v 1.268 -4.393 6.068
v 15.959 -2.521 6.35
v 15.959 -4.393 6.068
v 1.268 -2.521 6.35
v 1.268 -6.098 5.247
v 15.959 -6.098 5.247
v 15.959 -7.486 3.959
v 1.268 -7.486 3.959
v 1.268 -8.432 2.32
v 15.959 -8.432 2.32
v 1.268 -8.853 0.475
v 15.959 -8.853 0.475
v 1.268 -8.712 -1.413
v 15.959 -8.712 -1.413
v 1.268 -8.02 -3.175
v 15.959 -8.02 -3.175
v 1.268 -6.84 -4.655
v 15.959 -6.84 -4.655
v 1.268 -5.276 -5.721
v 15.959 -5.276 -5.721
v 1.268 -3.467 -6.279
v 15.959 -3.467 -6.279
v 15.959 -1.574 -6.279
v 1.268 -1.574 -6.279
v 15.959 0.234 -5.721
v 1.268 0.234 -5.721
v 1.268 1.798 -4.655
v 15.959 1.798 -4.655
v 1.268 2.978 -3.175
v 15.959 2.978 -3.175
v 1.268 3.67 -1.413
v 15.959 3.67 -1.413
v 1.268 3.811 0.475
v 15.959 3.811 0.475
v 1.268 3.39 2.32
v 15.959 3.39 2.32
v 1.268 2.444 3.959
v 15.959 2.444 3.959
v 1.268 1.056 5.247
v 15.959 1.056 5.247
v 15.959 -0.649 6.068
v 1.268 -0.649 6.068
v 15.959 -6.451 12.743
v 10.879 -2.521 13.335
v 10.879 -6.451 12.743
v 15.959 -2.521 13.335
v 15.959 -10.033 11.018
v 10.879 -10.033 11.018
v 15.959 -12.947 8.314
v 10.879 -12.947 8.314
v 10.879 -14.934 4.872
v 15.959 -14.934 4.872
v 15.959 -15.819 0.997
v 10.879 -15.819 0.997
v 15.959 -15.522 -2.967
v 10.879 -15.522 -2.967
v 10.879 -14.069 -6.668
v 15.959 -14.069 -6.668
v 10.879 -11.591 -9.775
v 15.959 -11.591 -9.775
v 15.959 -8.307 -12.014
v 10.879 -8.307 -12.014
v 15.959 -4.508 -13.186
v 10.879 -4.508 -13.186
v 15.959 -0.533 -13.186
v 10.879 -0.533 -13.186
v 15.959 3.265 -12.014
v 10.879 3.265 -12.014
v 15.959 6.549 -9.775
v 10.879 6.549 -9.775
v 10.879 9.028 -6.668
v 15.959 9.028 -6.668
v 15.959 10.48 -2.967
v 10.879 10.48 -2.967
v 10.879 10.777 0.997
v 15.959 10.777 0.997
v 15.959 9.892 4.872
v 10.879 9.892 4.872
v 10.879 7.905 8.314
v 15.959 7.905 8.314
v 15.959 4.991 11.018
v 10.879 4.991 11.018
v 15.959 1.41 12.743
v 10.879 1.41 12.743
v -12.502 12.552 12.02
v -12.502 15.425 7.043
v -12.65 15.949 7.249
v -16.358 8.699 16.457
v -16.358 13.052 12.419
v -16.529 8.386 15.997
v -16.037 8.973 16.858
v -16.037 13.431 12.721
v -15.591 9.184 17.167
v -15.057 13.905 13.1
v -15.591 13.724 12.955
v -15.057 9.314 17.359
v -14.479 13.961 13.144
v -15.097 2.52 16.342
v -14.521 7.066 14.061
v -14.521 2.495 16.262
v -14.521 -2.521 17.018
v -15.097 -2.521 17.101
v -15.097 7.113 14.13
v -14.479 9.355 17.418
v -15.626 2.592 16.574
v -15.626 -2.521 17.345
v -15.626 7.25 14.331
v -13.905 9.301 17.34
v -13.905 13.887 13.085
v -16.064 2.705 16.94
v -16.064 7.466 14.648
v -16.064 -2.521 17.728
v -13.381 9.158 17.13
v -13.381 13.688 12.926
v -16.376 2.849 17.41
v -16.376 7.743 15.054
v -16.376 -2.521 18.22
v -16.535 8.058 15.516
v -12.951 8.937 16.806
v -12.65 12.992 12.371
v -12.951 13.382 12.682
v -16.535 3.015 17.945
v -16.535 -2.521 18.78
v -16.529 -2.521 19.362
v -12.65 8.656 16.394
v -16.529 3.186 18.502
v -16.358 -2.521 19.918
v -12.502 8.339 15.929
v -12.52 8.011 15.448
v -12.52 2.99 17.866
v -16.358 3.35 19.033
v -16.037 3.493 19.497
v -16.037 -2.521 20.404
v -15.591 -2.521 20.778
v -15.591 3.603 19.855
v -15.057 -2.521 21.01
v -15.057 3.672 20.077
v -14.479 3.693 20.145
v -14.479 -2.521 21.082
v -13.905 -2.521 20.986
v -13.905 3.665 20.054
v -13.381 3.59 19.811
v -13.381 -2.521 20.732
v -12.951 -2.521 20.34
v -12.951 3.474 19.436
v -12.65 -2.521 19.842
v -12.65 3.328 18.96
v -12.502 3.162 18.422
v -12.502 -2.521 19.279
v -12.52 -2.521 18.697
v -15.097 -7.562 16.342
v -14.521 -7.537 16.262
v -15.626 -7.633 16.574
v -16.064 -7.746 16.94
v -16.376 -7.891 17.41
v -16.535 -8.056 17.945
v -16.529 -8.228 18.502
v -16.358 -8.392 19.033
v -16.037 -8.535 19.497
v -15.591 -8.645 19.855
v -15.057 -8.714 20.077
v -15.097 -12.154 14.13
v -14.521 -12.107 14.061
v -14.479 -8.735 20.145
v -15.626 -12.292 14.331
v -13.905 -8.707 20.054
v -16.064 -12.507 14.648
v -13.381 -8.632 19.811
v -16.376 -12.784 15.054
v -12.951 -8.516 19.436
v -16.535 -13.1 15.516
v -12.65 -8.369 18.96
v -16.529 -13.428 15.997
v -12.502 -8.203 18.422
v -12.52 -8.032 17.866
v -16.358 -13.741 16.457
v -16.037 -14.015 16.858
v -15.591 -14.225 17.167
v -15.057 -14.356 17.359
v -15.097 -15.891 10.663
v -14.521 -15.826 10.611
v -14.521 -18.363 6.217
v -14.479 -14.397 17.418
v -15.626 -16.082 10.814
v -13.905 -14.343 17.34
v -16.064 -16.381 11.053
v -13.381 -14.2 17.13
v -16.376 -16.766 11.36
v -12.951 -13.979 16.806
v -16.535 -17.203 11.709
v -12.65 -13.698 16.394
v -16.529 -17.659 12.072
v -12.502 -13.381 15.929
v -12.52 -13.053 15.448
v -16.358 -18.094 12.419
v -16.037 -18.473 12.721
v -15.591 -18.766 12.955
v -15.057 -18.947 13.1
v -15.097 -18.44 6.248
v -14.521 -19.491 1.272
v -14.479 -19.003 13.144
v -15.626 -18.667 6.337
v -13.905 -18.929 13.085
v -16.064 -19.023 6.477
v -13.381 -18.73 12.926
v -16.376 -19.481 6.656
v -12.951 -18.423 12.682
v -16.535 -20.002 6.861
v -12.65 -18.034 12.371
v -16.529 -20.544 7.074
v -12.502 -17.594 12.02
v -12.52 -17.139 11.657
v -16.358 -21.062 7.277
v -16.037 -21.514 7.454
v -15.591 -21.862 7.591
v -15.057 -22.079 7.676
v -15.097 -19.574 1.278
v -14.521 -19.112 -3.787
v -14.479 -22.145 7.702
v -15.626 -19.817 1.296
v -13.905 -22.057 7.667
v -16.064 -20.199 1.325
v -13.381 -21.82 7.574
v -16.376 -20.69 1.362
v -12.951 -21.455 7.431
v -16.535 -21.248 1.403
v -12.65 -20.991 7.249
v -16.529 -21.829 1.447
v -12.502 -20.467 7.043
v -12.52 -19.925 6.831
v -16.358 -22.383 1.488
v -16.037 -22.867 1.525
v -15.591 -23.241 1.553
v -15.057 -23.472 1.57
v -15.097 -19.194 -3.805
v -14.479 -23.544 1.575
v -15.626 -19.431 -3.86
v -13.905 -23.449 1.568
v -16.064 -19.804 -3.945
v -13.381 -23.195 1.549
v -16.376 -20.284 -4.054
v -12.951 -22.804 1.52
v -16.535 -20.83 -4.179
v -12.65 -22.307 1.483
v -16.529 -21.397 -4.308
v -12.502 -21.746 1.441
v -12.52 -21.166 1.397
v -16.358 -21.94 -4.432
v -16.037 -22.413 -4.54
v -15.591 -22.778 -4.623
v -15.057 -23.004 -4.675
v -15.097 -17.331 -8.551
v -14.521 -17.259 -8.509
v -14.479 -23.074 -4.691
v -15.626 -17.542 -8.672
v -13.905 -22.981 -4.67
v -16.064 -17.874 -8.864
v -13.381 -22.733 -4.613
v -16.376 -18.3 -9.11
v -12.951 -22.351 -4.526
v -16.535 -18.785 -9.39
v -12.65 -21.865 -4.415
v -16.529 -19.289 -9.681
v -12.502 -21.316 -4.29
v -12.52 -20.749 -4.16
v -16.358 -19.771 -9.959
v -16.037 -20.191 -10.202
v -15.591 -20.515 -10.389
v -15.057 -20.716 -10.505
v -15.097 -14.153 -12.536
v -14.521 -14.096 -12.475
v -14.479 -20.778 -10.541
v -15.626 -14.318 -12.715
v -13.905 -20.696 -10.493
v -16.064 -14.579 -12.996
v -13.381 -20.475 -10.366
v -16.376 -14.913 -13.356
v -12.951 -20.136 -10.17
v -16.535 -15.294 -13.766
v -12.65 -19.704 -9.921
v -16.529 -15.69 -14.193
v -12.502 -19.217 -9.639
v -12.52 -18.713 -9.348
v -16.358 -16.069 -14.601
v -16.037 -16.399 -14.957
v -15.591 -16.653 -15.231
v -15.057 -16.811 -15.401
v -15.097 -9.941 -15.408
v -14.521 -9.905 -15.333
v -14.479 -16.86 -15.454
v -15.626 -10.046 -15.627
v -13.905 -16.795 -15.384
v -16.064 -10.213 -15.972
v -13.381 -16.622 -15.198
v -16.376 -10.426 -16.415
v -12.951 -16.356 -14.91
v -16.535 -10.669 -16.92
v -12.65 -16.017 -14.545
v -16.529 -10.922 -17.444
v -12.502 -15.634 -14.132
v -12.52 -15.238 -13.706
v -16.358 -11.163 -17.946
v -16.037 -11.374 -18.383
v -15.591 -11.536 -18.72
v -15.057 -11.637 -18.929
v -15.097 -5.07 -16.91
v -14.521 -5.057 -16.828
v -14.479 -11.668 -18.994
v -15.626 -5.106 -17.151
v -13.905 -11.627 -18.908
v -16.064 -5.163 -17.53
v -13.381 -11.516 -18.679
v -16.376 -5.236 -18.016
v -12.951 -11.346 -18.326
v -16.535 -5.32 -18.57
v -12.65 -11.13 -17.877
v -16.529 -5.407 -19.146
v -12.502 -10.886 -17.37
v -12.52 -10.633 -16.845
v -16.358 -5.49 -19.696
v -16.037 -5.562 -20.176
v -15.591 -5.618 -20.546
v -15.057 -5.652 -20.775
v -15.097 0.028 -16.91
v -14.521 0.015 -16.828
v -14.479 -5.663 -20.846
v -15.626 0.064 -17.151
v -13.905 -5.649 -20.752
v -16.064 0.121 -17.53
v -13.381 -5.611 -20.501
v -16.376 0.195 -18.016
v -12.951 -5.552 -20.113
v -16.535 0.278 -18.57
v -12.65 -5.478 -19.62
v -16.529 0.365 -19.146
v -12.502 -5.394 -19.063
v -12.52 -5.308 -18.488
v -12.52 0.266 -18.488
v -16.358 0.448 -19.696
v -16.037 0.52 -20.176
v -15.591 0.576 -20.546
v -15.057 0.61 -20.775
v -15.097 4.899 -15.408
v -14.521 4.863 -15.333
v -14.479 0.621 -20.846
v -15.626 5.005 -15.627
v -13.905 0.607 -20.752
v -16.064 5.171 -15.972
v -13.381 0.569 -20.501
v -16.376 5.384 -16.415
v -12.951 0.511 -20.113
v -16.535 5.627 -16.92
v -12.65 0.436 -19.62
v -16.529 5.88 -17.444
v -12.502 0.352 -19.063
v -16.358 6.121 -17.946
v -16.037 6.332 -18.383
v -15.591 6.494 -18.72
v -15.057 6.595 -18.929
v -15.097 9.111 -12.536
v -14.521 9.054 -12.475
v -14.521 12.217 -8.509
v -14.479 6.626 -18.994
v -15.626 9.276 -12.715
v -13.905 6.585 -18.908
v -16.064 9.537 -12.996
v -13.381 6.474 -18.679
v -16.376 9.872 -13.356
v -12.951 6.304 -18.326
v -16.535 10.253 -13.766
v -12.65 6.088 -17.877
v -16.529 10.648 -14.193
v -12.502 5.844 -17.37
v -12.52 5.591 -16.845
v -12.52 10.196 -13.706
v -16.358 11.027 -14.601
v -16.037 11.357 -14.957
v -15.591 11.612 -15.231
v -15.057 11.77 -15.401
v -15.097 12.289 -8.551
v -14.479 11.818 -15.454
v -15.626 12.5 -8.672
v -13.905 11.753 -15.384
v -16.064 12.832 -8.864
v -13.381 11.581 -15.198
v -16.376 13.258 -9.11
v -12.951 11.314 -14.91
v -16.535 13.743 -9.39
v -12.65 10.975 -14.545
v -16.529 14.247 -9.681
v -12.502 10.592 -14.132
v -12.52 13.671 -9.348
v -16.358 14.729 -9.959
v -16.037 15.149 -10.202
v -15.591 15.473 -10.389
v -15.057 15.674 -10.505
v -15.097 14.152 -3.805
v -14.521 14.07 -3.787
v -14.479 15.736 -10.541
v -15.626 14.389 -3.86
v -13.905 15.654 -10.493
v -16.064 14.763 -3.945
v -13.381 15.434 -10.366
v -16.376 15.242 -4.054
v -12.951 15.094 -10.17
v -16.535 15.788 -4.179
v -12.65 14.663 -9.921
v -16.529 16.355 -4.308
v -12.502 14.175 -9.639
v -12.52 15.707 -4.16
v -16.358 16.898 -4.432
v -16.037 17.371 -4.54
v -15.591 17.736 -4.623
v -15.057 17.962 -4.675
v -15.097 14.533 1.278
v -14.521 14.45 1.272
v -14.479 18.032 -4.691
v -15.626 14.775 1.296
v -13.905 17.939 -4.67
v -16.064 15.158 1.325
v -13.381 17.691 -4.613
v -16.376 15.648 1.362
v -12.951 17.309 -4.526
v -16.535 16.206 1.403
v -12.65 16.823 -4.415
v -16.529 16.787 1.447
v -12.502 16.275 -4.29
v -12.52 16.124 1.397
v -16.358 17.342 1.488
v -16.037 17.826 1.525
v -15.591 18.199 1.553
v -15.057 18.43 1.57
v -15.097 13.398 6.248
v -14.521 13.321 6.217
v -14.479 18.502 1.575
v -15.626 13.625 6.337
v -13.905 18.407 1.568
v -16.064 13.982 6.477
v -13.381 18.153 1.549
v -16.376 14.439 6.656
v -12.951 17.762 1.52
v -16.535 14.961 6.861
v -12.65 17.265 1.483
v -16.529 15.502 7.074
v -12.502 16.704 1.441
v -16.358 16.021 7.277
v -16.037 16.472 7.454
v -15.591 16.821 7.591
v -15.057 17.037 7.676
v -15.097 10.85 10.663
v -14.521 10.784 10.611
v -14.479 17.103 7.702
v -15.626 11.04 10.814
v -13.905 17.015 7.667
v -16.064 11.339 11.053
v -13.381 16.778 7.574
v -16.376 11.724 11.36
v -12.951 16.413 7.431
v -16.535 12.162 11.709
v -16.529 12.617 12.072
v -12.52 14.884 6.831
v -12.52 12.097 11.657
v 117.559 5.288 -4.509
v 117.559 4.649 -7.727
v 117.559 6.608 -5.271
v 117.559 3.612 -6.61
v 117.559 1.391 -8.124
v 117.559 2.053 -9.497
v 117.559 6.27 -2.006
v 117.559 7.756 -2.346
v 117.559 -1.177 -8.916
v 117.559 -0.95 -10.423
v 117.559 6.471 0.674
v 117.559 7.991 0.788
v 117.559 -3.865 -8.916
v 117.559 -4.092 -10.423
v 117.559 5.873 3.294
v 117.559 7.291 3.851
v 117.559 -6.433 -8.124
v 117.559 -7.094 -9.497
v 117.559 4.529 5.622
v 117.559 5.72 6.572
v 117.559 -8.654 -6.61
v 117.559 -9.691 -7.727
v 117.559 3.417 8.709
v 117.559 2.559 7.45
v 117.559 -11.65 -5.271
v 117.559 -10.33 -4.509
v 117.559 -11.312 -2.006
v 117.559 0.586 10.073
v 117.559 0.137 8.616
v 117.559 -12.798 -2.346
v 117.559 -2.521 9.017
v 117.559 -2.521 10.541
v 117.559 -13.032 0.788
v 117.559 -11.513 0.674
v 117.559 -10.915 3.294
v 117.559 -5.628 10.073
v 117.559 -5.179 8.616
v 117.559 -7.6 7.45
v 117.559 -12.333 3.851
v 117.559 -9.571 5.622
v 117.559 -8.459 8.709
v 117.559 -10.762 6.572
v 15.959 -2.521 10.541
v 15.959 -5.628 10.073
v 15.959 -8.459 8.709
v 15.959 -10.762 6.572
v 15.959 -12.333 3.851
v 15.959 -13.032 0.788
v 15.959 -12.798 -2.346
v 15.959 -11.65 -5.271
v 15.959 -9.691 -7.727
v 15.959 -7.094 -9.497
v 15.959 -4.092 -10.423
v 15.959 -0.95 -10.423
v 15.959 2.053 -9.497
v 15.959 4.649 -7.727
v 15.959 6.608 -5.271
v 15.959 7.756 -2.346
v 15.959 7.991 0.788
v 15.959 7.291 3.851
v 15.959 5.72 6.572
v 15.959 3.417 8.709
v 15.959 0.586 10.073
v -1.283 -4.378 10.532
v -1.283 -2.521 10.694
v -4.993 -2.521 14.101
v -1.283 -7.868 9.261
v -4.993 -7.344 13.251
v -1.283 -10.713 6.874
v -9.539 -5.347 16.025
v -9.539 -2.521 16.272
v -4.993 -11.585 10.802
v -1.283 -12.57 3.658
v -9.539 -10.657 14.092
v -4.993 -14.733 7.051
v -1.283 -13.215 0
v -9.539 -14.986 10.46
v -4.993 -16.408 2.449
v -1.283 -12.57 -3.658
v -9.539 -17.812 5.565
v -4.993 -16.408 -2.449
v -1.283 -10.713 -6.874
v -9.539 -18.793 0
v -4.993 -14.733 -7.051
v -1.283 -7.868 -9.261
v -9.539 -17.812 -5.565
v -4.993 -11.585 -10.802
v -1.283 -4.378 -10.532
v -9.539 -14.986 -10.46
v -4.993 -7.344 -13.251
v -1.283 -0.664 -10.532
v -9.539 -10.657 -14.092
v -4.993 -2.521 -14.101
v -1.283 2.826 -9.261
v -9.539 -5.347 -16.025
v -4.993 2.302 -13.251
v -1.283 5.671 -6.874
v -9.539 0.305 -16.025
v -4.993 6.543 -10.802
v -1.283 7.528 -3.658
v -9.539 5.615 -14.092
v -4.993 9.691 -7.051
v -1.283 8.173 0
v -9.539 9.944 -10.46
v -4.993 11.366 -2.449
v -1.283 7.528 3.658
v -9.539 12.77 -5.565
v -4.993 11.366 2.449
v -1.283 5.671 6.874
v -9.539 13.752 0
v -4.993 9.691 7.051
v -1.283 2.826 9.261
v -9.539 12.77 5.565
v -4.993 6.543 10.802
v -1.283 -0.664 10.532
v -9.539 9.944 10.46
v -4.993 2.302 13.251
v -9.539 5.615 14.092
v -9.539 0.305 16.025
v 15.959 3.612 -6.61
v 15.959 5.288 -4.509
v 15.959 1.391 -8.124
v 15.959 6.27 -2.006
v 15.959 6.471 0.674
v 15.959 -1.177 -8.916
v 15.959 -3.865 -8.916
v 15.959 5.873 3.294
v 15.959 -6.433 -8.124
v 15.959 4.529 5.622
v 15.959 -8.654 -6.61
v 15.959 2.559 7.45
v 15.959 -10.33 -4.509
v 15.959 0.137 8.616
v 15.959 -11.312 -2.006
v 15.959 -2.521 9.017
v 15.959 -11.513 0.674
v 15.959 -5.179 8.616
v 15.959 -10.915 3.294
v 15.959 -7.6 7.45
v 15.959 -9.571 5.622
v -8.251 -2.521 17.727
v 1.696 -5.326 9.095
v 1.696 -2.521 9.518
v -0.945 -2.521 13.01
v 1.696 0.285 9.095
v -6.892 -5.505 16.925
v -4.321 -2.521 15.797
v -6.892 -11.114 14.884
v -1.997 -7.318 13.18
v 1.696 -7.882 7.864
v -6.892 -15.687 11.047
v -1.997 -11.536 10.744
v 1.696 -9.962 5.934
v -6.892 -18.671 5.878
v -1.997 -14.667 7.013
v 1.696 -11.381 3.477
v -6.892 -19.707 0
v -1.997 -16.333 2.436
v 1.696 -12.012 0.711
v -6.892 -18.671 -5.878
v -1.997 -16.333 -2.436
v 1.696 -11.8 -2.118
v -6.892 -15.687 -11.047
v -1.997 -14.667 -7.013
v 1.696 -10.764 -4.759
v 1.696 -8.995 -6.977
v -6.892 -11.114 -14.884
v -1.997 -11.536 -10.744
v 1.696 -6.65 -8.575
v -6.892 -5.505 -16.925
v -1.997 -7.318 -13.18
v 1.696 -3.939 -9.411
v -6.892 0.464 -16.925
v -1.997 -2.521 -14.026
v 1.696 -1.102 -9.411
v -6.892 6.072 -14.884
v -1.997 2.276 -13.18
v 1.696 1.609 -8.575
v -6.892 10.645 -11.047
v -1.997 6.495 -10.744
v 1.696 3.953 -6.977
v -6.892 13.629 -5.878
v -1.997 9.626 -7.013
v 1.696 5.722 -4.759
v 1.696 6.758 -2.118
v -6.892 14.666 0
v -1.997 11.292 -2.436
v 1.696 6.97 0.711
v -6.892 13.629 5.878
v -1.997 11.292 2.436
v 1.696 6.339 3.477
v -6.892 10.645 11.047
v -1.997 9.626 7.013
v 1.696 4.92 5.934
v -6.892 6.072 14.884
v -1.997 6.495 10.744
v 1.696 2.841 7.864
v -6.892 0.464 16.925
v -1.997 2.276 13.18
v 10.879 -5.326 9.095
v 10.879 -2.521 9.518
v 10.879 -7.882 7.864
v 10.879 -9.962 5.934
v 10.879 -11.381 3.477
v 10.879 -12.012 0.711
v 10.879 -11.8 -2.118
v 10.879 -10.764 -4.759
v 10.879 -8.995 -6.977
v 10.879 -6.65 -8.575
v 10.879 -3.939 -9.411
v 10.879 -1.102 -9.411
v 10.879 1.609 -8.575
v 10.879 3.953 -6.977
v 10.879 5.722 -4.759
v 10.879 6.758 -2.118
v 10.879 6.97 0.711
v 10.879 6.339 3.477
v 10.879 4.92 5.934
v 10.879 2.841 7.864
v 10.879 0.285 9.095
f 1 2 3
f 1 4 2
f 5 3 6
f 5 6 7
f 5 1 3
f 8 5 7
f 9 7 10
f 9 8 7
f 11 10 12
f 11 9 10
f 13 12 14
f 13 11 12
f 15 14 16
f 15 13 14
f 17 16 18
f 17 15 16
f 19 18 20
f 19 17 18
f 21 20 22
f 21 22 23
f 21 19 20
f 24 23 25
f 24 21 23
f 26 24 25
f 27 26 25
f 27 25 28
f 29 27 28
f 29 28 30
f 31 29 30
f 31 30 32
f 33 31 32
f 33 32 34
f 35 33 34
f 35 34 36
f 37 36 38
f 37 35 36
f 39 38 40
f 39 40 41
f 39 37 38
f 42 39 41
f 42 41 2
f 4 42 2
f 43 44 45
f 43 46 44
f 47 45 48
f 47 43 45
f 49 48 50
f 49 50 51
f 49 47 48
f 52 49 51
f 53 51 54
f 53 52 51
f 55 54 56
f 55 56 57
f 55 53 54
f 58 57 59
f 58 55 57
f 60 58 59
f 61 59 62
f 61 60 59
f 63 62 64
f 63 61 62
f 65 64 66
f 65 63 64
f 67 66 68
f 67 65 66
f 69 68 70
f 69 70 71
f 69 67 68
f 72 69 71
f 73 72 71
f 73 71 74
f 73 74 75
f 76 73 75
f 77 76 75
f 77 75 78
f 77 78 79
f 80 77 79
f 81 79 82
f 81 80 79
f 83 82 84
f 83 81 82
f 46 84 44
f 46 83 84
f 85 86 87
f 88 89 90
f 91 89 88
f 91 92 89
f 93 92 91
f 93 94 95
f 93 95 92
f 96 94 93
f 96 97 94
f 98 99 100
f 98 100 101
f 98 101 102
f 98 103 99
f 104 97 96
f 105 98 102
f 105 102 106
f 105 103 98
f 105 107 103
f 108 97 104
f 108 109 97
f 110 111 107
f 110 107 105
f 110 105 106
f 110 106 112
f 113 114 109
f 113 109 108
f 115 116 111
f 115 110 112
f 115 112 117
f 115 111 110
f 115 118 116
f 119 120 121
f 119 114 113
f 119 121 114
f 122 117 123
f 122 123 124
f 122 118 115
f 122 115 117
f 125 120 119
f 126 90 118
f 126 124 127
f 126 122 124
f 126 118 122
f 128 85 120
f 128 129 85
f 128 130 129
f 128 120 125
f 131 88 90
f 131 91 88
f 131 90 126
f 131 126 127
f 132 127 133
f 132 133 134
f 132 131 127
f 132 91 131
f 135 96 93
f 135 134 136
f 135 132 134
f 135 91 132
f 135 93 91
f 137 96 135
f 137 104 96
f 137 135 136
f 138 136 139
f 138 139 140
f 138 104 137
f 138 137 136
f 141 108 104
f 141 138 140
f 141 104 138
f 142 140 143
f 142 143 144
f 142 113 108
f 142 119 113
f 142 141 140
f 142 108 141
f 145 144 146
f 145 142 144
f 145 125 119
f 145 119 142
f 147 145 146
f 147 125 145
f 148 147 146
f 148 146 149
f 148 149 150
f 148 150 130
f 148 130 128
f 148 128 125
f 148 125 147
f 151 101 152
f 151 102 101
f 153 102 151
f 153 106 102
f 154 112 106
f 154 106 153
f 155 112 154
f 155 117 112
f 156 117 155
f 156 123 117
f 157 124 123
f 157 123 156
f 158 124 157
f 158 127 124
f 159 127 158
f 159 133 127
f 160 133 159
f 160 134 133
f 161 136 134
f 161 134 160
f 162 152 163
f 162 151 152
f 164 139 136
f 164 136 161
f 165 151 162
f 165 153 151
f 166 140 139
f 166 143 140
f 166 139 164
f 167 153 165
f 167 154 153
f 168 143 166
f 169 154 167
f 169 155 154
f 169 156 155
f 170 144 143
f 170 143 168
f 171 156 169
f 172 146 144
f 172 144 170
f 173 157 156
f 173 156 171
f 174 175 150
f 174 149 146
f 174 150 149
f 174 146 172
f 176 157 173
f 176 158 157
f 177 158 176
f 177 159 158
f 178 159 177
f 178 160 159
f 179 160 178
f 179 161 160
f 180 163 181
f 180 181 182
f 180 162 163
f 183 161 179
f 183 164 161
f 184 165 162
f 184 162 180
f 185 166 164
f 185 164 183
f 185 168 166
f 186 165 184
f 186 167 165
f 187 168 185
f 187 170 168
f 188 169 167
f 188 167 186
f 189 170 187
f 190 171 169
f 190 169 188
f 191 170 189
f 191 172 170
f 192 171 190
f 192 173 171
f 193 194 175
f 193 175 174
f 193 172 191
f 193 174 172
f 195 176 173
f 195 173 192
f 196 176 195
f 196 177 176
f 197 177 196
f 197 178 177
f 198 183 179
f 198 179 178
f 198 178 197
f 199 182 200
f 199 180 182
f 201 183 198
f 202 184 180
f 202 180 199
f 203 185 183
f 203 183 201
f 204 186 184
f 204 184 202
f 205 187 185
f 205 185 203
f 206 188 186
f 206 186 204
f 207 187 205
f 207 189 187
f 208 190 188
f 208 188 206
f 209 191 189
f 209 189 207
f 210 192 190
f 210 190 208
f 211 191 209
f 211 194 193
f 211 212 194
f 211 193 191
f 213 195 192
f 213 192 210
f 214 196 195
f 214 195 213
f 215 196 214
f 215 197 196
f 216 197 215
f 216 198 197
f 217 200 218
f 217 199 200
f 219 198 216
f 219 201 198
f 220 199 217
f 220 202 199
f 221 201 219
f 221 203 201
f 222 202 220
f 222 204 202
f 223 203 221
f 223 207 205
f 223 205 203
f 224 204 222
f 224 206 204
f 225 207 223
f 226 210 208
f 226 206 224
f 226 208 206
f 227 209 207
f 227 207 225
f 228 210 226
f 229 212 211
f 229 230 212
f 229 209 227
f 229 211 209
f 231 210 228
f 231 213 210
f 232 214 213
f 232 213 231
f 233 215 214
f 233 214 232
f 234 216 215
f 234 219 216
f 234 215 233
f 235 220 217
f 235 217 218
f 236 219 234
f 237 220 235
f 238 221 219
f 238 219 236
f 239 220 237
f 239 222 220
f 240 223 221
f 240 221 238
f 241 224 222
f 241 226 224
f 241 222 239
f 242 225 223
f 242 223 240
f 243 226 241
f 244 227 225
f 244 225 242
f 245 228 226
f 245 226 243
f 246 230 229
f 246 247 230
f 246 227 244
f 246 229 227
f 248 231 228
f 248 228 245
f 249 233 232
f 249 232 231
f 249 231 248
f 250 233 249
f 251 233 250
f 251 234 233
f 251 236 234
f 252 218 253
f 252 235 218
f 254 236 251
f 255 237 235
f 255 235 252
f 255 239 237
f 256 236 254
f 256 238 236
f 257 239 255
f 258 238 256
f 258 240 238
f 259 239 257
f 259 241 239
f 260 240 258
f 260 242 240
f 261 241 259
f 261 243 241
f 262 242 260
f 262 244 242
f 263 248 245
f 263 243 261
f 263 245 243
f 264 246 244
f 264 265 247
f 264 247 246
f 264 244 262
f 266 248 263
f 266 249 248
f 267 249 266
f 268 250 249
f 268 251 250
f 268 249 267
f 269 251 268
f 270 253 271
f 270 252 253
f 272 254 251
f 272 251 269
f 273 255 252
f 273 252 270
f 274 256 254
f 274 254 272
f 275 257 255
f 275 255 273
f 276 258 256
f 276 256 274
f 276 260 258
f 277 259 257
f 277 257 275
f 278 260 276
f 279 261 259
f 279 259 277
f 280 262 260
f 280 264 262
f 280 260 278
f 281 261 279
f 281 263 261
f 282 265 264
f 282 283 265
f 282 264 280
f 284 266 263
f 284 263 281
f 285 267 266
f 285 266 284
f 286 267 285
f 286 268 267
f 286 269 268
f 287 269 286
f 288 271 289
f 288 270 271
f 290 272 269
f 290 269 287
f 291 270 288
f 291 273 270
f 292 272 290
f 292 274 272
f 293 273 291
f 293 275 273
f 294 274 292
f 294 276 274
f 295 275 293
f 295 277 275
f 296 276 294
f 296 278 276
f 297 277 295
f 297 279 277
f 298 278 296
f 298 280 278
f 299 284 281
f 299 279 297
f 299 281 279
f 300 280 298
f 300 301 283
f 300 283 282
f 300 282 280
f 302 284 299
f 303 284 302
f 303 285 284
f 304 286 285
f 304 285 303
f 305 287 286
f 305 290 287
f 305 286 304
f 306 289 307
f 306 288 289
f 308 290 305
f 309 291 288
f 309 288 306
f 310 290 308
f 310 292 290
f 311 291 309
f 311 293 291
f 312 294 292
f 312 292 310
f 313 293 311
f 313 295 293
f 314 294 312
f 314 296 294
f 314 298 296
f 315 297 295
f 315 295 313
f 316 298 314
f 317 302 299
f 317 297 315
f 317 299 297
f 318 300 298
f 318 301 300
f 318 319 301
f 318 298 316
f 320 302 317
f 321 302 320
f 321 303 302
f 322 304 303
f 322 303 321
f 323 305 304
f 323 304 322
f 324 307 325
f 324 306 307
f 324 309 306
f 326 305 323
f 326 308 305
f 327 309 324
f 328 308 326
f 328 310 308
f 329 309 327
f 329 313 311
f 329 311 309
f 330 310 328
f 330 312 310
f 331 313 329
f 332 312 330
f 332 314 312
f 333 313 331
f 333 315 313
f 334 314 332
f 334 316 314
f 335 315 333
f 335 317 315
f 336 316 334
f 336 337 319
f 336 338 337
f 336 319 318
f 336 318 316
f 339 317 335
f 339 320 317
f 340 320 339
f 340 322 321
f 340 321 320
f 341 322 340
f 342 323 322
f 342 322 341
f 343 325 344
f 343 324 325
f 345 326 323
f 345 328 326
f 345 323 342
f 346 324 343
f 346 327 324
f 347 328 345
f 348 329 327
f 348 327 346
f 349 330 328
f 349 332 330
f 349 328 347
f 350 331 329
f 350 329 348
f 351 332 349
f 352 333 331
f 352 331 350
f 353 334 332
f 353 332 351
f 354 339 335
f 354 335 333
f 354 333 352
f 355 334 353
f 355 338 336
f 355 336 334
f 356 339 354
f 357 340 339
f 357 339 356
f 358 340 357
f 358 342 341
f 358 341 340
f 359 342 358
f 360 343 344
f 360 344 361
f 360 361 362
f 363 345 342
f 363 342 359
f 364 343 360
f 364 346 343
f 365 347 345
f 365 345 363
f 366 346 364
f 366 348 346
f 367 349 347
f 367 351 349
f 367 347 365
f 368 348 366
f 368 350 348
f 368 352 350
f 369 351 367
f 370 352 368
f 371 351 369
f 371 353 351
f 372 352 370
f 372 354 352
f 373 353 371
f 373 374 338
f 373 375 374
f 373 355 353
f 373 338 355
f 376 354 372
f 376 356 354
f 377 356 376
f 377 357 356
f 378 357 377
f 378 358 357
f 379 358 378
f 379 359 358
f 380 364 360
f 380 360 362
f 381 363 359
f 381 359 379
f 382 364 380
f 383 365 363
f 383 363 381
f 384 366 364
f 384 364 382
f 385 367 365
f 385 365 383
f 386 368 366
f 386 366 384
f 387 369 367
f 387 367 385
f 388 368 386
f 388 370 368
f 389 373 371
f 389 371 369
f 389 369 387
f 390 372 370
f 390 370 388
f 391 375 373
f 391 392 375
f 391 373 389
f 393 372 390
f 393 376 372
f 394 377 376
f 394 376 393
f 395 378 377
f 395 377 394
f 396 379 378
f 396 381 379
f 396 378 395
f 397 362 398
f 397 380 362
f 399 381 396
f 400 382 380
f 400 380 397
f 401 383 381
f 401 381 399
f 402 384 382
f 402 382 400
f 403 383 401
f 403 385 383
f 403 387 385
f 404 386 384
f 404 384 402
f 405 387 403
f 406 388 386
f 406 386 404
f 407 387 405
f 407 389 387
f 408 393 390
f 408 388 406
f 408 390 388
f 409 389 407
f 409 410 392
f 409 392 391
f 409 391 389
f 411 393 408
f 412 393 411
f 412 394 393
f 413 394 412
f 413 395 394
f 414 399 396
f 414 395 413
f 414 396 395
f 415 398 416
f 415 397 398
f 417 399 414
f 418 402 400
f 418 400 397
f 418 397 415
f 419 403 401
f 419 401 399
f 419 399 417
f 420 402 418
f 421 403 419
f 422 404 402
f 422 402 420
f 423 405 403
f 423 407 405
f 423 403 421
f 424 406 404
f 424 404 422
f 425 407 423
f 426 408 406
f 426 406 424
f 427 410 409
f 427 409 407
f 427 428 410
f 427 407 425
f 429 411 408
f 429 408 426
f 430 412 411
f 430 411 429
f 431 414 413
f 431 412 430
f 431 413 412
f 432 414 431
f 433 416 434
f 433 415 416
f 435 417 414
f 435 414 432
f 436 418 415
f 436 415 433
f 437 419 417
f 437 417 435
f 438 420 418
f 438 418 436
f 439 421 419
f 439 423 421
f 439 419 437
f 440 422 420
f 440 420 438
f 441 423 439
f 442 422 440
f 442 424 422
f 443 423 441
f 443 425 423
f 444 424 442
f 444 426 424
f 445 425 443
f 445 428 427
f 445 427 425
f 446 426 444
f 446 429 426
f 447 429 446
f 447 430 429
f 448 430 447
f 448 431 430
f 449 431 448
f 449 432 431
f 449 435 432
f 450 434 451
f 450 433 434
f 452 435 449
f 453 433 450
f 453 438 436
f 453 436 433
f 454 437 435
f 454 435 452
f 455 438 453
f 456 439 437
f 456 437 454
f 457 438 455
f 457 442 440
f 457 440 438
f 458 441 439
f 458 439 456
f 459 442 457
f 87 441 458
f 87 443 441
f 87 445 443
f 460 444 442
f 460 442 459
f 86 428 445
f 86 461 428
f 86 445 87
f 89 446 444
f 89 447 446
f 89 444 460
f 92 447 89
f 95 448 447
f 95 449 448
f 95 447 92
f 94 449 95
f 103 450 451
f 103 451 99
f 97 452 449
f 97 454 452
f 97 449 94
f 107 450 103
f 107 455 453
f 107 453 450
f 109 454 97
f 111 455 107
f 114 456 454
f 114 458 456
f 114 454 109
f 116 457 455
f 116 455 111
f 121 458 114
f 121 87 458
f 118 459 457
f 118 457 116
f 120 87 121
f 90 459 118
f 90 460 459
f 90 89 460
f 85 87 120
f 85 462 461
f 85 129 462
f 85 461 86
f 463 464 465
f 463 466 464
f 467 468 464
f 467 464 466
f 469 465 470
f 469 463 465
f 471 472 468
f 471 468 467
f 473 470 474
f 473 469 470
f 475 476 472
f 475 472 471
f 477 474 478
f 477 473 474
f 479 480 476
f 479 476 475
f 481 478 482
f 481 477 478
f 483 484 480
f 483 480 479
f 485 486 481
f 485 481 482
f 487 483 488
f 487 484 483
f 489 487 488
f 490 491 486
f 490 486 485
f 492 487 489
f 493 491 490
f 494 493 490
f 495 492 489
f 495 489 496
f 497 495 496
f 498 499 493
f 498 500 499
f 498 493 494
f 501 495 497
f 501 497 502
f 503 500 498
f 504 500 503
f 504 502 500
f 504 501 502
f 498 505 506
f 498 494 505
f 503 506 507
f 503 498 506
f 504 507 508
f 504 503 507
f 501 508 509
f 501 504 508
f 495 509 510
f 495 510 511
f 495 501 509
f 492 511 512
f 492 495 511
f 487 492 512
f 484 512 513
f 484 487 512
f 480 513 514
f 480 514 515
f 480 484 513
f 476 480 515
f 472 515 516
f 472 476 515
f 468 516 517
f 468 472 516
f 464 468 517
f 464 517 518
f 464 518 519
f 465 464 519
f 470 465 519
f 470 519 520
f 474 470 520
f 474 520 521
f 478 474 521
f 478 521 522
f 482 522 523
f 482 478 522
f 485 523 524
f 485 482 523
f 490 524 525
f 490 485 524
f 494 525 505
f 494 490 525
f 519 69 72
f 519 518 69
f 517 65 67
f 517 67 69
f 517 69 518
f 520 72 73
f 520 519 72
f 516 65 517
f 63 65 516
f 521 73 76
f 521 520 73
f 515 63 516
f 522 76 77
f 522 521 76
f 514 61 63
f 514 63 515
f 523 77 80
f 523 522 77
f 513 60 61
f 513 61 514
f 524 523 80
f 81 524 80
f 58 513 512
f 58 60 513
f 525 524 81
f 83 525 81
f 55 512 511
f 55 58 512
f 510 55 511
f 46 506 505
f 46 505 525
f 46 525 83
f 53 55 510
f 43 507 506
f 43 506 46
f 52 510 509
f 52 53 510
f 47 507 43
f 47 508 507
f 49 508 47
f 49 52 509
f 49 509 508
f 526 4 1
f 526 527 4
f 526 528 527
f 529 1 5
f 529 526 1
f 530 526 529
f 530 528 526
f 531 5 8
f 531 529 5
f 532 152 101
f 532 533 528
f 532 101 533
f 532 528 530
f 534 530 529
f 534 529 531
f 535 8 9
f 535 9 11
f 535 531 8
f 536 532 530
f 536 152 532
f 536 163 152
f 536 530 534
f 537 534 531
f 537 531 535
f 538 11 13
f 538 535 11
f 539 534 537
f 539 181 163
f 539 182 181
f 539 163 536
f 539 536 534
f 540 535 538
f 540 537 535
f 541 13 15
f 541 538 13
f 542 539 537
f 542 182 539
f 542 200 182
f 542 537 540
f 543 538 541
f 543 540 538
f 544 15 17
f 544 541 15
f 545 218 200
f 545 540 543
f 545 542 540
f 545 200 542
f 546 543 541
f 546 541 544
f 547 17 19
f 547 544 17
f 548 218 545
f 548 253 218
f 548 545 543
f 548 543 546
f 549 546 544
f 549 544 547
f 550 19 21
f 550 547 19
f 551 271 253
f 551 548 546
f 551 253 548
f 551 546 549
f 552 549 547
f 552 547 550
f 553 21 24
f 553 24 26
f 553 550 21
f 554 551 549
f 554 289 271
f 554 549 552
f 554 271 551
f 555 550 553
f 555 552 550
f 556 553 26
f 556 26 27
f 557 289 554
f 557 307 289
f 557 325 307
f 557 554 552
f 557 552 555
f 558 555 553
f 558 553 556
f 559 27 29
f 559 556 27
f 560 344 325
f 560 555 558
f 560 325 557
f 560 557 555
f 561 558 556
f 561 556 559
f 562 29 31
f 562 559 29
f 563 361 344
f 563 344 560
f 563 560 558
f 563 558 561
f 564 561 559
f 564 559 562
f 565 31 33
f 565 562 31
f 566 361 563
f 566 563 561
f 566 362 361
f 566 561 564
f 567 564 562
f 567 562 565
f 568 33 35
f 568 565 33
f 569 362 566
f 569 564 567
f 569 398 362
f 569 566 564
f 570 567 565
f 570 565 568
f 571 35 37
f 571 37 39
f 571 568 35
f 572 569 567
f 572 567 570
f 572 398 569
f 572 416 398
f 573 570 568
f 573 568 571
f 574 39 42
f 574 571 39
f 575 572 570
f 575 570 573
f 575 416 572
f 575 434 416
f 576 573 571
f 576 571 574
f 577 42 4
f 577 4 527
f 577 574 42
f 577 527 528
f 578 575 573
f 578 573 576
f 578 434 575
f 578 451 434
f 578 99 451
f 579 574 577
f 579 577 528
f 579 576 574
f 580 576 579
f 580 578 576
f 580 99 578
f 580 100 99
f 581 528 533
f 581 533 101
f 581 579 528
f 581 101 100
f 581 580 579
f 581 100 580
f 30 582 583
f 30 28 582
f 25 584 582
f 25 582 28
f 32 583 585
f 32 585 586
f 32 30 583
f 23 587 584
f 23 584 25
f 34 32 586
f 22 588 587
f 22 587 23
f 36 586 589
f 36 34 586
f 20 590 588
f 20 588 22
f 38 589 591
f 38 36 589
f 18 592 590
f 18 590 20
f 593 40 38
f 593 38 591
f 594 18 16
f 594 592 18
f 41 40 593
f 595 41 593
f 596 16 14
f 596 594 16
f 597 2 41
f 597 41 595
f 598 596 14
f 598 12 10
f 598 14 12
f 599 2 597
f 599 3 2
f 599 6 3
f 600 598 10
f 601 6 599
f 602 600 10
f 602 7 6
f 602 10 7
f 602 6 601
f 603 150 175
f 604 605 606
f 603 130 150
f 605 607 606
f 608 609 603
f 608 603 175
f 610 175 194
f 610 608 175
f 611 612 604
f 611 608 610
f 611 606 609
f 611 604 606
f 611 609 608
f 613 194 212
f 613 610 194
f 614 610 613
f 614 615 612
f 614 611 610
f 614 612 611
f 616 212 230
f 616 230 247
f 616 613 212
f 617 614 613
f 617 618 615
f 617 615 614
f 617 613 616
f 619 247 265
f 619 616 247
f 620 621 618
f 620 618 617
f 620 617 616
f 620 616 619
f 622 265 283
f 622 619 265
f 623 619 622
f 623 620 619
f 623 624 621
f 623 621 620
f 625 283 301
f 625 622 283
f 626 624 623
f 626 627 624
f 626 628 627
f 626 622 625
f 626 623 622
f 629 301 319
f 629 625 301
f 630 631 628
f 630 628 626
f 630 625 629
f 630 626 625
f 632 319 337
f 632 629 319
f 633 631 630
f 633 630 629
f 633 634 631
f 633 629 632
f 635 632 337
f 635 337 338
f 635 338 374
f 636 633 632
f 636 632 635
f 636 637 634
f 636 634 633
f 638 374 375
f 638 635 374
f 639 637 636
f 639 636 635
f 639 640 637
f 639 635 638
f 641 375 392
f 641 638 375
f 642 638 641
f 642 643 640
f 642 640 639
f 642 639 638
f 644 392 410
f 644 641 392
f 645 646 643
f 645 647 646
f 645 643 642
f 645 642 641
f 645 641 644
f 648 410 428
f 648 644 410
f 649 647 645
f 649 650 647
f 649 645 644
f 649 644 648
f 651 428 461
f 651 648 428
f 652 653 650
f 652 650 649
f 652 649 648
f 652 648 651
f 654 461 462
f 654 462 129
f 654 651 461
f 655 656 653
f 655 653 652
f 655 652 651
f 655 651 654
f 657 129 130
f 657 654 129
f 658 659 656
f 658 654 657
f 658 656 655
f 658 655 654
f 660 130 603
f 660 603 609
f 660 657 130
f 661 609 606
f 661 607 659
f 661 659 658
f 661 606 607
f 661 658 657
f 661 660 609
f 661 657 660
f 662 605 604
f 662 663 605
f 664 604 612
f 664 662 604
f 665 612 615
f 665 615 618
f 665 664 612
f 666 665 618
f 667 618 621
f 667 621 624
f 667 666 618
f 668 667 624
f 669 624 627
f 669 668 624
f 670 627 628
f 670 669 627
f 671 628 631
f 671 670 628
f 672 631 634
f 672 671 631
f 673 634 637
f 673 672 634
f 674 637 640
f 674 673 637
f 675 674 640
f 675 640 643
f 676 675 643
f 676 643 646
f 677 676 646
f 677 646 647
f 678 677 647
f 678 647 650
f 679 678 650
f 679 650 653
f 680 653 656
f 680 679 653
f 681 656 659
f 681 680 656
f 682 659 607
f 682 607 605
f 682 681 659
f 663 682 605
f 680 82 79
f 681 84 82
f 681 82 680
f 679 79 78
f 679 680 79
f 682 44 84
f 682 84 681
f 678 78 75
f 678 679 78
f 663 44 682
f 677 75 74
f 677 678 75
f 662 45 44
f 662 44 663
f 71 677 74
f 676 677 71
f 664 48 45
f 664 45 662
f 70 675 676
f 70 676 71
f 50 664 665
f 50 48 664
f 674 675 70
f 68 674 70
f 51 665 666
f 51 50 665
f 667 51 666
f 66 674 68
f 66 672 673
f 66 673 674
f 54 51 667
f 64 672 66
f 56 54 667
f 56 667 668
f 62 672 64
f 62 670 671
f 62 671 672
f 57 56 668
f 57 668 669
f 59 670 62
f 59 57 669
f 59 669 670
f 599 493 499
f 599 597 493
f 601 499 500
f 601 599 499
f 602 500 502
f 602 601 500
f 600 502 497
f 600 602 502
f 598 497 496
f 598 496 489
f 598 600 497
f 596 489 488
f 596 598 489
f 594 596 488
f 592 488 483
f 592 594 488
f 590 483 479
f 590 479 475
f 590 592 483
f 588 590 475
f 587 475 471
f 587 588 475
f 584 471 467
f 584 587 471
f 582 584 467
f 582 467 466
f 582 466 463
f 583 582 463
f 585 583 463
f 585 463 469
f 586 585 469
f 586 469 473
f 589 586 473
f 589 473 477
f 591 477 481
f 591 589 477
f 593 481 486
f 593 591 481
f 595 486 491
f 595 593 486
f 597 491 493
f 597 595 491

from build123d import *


with BuildPart() as part:
    # Sketch1 → Revolve1 (revolve)
    with BuildSketch(Plane.XY, mode=Mode.PRIVATE) as revolve1_sk:
        with BuildLine():
            Line((117.55898886, 6.49609803), (15.95898886, 6.49609803))
            Line((15.95898886, 6.49609803), (15.95898886, 3.82909803))
            Line((15.95898886, 3.82909803), (10.87898886, 3.82909803))
            Line((10.87898886, 3.82909803), (1.267903452, 3.82909803))
            ThreePointArc((1.267903452, 3.82909803), (-4.993471479, 11.580101966), (-14.52101114, 14.49709803))
            ThreePointArc((-14.52101114, 14.49709803), (-15.827069138, 18.085772853), (-12.519920979, 16.176022729))
            ThreePointArc((-12.519920979, 16.176022729), (-4.32104899, 13.27593718), (1.696011458, 6.996846349))
            Line((1.696011458, 6.996846349), (10.87898886, 6.996846349))
            Line((10.87898886, 6.996846349), (10.87898886, 10.81409803))
            Line((10.87898886, 10.81409803), (15.95898886, 10.81409803))
            Line((15.95898886, 10.81409803), (15.95898886, 8.02009803))
            Line((15.95898886, 8.02009803), (117.55898886, 8.02009803))
            Line((117.55898886, 8.02009803), (117.55898886, 6.49609803))
        make_face()
    revolve(revolve1_sk.sketch.rotate(Axis((-17.599665341, -2.52090197, 0), (1, 0, 0)), 90), axis=Axis((-17.599665341, -2.52090197, 0), (1, 0, 0)))


solid = part.part
